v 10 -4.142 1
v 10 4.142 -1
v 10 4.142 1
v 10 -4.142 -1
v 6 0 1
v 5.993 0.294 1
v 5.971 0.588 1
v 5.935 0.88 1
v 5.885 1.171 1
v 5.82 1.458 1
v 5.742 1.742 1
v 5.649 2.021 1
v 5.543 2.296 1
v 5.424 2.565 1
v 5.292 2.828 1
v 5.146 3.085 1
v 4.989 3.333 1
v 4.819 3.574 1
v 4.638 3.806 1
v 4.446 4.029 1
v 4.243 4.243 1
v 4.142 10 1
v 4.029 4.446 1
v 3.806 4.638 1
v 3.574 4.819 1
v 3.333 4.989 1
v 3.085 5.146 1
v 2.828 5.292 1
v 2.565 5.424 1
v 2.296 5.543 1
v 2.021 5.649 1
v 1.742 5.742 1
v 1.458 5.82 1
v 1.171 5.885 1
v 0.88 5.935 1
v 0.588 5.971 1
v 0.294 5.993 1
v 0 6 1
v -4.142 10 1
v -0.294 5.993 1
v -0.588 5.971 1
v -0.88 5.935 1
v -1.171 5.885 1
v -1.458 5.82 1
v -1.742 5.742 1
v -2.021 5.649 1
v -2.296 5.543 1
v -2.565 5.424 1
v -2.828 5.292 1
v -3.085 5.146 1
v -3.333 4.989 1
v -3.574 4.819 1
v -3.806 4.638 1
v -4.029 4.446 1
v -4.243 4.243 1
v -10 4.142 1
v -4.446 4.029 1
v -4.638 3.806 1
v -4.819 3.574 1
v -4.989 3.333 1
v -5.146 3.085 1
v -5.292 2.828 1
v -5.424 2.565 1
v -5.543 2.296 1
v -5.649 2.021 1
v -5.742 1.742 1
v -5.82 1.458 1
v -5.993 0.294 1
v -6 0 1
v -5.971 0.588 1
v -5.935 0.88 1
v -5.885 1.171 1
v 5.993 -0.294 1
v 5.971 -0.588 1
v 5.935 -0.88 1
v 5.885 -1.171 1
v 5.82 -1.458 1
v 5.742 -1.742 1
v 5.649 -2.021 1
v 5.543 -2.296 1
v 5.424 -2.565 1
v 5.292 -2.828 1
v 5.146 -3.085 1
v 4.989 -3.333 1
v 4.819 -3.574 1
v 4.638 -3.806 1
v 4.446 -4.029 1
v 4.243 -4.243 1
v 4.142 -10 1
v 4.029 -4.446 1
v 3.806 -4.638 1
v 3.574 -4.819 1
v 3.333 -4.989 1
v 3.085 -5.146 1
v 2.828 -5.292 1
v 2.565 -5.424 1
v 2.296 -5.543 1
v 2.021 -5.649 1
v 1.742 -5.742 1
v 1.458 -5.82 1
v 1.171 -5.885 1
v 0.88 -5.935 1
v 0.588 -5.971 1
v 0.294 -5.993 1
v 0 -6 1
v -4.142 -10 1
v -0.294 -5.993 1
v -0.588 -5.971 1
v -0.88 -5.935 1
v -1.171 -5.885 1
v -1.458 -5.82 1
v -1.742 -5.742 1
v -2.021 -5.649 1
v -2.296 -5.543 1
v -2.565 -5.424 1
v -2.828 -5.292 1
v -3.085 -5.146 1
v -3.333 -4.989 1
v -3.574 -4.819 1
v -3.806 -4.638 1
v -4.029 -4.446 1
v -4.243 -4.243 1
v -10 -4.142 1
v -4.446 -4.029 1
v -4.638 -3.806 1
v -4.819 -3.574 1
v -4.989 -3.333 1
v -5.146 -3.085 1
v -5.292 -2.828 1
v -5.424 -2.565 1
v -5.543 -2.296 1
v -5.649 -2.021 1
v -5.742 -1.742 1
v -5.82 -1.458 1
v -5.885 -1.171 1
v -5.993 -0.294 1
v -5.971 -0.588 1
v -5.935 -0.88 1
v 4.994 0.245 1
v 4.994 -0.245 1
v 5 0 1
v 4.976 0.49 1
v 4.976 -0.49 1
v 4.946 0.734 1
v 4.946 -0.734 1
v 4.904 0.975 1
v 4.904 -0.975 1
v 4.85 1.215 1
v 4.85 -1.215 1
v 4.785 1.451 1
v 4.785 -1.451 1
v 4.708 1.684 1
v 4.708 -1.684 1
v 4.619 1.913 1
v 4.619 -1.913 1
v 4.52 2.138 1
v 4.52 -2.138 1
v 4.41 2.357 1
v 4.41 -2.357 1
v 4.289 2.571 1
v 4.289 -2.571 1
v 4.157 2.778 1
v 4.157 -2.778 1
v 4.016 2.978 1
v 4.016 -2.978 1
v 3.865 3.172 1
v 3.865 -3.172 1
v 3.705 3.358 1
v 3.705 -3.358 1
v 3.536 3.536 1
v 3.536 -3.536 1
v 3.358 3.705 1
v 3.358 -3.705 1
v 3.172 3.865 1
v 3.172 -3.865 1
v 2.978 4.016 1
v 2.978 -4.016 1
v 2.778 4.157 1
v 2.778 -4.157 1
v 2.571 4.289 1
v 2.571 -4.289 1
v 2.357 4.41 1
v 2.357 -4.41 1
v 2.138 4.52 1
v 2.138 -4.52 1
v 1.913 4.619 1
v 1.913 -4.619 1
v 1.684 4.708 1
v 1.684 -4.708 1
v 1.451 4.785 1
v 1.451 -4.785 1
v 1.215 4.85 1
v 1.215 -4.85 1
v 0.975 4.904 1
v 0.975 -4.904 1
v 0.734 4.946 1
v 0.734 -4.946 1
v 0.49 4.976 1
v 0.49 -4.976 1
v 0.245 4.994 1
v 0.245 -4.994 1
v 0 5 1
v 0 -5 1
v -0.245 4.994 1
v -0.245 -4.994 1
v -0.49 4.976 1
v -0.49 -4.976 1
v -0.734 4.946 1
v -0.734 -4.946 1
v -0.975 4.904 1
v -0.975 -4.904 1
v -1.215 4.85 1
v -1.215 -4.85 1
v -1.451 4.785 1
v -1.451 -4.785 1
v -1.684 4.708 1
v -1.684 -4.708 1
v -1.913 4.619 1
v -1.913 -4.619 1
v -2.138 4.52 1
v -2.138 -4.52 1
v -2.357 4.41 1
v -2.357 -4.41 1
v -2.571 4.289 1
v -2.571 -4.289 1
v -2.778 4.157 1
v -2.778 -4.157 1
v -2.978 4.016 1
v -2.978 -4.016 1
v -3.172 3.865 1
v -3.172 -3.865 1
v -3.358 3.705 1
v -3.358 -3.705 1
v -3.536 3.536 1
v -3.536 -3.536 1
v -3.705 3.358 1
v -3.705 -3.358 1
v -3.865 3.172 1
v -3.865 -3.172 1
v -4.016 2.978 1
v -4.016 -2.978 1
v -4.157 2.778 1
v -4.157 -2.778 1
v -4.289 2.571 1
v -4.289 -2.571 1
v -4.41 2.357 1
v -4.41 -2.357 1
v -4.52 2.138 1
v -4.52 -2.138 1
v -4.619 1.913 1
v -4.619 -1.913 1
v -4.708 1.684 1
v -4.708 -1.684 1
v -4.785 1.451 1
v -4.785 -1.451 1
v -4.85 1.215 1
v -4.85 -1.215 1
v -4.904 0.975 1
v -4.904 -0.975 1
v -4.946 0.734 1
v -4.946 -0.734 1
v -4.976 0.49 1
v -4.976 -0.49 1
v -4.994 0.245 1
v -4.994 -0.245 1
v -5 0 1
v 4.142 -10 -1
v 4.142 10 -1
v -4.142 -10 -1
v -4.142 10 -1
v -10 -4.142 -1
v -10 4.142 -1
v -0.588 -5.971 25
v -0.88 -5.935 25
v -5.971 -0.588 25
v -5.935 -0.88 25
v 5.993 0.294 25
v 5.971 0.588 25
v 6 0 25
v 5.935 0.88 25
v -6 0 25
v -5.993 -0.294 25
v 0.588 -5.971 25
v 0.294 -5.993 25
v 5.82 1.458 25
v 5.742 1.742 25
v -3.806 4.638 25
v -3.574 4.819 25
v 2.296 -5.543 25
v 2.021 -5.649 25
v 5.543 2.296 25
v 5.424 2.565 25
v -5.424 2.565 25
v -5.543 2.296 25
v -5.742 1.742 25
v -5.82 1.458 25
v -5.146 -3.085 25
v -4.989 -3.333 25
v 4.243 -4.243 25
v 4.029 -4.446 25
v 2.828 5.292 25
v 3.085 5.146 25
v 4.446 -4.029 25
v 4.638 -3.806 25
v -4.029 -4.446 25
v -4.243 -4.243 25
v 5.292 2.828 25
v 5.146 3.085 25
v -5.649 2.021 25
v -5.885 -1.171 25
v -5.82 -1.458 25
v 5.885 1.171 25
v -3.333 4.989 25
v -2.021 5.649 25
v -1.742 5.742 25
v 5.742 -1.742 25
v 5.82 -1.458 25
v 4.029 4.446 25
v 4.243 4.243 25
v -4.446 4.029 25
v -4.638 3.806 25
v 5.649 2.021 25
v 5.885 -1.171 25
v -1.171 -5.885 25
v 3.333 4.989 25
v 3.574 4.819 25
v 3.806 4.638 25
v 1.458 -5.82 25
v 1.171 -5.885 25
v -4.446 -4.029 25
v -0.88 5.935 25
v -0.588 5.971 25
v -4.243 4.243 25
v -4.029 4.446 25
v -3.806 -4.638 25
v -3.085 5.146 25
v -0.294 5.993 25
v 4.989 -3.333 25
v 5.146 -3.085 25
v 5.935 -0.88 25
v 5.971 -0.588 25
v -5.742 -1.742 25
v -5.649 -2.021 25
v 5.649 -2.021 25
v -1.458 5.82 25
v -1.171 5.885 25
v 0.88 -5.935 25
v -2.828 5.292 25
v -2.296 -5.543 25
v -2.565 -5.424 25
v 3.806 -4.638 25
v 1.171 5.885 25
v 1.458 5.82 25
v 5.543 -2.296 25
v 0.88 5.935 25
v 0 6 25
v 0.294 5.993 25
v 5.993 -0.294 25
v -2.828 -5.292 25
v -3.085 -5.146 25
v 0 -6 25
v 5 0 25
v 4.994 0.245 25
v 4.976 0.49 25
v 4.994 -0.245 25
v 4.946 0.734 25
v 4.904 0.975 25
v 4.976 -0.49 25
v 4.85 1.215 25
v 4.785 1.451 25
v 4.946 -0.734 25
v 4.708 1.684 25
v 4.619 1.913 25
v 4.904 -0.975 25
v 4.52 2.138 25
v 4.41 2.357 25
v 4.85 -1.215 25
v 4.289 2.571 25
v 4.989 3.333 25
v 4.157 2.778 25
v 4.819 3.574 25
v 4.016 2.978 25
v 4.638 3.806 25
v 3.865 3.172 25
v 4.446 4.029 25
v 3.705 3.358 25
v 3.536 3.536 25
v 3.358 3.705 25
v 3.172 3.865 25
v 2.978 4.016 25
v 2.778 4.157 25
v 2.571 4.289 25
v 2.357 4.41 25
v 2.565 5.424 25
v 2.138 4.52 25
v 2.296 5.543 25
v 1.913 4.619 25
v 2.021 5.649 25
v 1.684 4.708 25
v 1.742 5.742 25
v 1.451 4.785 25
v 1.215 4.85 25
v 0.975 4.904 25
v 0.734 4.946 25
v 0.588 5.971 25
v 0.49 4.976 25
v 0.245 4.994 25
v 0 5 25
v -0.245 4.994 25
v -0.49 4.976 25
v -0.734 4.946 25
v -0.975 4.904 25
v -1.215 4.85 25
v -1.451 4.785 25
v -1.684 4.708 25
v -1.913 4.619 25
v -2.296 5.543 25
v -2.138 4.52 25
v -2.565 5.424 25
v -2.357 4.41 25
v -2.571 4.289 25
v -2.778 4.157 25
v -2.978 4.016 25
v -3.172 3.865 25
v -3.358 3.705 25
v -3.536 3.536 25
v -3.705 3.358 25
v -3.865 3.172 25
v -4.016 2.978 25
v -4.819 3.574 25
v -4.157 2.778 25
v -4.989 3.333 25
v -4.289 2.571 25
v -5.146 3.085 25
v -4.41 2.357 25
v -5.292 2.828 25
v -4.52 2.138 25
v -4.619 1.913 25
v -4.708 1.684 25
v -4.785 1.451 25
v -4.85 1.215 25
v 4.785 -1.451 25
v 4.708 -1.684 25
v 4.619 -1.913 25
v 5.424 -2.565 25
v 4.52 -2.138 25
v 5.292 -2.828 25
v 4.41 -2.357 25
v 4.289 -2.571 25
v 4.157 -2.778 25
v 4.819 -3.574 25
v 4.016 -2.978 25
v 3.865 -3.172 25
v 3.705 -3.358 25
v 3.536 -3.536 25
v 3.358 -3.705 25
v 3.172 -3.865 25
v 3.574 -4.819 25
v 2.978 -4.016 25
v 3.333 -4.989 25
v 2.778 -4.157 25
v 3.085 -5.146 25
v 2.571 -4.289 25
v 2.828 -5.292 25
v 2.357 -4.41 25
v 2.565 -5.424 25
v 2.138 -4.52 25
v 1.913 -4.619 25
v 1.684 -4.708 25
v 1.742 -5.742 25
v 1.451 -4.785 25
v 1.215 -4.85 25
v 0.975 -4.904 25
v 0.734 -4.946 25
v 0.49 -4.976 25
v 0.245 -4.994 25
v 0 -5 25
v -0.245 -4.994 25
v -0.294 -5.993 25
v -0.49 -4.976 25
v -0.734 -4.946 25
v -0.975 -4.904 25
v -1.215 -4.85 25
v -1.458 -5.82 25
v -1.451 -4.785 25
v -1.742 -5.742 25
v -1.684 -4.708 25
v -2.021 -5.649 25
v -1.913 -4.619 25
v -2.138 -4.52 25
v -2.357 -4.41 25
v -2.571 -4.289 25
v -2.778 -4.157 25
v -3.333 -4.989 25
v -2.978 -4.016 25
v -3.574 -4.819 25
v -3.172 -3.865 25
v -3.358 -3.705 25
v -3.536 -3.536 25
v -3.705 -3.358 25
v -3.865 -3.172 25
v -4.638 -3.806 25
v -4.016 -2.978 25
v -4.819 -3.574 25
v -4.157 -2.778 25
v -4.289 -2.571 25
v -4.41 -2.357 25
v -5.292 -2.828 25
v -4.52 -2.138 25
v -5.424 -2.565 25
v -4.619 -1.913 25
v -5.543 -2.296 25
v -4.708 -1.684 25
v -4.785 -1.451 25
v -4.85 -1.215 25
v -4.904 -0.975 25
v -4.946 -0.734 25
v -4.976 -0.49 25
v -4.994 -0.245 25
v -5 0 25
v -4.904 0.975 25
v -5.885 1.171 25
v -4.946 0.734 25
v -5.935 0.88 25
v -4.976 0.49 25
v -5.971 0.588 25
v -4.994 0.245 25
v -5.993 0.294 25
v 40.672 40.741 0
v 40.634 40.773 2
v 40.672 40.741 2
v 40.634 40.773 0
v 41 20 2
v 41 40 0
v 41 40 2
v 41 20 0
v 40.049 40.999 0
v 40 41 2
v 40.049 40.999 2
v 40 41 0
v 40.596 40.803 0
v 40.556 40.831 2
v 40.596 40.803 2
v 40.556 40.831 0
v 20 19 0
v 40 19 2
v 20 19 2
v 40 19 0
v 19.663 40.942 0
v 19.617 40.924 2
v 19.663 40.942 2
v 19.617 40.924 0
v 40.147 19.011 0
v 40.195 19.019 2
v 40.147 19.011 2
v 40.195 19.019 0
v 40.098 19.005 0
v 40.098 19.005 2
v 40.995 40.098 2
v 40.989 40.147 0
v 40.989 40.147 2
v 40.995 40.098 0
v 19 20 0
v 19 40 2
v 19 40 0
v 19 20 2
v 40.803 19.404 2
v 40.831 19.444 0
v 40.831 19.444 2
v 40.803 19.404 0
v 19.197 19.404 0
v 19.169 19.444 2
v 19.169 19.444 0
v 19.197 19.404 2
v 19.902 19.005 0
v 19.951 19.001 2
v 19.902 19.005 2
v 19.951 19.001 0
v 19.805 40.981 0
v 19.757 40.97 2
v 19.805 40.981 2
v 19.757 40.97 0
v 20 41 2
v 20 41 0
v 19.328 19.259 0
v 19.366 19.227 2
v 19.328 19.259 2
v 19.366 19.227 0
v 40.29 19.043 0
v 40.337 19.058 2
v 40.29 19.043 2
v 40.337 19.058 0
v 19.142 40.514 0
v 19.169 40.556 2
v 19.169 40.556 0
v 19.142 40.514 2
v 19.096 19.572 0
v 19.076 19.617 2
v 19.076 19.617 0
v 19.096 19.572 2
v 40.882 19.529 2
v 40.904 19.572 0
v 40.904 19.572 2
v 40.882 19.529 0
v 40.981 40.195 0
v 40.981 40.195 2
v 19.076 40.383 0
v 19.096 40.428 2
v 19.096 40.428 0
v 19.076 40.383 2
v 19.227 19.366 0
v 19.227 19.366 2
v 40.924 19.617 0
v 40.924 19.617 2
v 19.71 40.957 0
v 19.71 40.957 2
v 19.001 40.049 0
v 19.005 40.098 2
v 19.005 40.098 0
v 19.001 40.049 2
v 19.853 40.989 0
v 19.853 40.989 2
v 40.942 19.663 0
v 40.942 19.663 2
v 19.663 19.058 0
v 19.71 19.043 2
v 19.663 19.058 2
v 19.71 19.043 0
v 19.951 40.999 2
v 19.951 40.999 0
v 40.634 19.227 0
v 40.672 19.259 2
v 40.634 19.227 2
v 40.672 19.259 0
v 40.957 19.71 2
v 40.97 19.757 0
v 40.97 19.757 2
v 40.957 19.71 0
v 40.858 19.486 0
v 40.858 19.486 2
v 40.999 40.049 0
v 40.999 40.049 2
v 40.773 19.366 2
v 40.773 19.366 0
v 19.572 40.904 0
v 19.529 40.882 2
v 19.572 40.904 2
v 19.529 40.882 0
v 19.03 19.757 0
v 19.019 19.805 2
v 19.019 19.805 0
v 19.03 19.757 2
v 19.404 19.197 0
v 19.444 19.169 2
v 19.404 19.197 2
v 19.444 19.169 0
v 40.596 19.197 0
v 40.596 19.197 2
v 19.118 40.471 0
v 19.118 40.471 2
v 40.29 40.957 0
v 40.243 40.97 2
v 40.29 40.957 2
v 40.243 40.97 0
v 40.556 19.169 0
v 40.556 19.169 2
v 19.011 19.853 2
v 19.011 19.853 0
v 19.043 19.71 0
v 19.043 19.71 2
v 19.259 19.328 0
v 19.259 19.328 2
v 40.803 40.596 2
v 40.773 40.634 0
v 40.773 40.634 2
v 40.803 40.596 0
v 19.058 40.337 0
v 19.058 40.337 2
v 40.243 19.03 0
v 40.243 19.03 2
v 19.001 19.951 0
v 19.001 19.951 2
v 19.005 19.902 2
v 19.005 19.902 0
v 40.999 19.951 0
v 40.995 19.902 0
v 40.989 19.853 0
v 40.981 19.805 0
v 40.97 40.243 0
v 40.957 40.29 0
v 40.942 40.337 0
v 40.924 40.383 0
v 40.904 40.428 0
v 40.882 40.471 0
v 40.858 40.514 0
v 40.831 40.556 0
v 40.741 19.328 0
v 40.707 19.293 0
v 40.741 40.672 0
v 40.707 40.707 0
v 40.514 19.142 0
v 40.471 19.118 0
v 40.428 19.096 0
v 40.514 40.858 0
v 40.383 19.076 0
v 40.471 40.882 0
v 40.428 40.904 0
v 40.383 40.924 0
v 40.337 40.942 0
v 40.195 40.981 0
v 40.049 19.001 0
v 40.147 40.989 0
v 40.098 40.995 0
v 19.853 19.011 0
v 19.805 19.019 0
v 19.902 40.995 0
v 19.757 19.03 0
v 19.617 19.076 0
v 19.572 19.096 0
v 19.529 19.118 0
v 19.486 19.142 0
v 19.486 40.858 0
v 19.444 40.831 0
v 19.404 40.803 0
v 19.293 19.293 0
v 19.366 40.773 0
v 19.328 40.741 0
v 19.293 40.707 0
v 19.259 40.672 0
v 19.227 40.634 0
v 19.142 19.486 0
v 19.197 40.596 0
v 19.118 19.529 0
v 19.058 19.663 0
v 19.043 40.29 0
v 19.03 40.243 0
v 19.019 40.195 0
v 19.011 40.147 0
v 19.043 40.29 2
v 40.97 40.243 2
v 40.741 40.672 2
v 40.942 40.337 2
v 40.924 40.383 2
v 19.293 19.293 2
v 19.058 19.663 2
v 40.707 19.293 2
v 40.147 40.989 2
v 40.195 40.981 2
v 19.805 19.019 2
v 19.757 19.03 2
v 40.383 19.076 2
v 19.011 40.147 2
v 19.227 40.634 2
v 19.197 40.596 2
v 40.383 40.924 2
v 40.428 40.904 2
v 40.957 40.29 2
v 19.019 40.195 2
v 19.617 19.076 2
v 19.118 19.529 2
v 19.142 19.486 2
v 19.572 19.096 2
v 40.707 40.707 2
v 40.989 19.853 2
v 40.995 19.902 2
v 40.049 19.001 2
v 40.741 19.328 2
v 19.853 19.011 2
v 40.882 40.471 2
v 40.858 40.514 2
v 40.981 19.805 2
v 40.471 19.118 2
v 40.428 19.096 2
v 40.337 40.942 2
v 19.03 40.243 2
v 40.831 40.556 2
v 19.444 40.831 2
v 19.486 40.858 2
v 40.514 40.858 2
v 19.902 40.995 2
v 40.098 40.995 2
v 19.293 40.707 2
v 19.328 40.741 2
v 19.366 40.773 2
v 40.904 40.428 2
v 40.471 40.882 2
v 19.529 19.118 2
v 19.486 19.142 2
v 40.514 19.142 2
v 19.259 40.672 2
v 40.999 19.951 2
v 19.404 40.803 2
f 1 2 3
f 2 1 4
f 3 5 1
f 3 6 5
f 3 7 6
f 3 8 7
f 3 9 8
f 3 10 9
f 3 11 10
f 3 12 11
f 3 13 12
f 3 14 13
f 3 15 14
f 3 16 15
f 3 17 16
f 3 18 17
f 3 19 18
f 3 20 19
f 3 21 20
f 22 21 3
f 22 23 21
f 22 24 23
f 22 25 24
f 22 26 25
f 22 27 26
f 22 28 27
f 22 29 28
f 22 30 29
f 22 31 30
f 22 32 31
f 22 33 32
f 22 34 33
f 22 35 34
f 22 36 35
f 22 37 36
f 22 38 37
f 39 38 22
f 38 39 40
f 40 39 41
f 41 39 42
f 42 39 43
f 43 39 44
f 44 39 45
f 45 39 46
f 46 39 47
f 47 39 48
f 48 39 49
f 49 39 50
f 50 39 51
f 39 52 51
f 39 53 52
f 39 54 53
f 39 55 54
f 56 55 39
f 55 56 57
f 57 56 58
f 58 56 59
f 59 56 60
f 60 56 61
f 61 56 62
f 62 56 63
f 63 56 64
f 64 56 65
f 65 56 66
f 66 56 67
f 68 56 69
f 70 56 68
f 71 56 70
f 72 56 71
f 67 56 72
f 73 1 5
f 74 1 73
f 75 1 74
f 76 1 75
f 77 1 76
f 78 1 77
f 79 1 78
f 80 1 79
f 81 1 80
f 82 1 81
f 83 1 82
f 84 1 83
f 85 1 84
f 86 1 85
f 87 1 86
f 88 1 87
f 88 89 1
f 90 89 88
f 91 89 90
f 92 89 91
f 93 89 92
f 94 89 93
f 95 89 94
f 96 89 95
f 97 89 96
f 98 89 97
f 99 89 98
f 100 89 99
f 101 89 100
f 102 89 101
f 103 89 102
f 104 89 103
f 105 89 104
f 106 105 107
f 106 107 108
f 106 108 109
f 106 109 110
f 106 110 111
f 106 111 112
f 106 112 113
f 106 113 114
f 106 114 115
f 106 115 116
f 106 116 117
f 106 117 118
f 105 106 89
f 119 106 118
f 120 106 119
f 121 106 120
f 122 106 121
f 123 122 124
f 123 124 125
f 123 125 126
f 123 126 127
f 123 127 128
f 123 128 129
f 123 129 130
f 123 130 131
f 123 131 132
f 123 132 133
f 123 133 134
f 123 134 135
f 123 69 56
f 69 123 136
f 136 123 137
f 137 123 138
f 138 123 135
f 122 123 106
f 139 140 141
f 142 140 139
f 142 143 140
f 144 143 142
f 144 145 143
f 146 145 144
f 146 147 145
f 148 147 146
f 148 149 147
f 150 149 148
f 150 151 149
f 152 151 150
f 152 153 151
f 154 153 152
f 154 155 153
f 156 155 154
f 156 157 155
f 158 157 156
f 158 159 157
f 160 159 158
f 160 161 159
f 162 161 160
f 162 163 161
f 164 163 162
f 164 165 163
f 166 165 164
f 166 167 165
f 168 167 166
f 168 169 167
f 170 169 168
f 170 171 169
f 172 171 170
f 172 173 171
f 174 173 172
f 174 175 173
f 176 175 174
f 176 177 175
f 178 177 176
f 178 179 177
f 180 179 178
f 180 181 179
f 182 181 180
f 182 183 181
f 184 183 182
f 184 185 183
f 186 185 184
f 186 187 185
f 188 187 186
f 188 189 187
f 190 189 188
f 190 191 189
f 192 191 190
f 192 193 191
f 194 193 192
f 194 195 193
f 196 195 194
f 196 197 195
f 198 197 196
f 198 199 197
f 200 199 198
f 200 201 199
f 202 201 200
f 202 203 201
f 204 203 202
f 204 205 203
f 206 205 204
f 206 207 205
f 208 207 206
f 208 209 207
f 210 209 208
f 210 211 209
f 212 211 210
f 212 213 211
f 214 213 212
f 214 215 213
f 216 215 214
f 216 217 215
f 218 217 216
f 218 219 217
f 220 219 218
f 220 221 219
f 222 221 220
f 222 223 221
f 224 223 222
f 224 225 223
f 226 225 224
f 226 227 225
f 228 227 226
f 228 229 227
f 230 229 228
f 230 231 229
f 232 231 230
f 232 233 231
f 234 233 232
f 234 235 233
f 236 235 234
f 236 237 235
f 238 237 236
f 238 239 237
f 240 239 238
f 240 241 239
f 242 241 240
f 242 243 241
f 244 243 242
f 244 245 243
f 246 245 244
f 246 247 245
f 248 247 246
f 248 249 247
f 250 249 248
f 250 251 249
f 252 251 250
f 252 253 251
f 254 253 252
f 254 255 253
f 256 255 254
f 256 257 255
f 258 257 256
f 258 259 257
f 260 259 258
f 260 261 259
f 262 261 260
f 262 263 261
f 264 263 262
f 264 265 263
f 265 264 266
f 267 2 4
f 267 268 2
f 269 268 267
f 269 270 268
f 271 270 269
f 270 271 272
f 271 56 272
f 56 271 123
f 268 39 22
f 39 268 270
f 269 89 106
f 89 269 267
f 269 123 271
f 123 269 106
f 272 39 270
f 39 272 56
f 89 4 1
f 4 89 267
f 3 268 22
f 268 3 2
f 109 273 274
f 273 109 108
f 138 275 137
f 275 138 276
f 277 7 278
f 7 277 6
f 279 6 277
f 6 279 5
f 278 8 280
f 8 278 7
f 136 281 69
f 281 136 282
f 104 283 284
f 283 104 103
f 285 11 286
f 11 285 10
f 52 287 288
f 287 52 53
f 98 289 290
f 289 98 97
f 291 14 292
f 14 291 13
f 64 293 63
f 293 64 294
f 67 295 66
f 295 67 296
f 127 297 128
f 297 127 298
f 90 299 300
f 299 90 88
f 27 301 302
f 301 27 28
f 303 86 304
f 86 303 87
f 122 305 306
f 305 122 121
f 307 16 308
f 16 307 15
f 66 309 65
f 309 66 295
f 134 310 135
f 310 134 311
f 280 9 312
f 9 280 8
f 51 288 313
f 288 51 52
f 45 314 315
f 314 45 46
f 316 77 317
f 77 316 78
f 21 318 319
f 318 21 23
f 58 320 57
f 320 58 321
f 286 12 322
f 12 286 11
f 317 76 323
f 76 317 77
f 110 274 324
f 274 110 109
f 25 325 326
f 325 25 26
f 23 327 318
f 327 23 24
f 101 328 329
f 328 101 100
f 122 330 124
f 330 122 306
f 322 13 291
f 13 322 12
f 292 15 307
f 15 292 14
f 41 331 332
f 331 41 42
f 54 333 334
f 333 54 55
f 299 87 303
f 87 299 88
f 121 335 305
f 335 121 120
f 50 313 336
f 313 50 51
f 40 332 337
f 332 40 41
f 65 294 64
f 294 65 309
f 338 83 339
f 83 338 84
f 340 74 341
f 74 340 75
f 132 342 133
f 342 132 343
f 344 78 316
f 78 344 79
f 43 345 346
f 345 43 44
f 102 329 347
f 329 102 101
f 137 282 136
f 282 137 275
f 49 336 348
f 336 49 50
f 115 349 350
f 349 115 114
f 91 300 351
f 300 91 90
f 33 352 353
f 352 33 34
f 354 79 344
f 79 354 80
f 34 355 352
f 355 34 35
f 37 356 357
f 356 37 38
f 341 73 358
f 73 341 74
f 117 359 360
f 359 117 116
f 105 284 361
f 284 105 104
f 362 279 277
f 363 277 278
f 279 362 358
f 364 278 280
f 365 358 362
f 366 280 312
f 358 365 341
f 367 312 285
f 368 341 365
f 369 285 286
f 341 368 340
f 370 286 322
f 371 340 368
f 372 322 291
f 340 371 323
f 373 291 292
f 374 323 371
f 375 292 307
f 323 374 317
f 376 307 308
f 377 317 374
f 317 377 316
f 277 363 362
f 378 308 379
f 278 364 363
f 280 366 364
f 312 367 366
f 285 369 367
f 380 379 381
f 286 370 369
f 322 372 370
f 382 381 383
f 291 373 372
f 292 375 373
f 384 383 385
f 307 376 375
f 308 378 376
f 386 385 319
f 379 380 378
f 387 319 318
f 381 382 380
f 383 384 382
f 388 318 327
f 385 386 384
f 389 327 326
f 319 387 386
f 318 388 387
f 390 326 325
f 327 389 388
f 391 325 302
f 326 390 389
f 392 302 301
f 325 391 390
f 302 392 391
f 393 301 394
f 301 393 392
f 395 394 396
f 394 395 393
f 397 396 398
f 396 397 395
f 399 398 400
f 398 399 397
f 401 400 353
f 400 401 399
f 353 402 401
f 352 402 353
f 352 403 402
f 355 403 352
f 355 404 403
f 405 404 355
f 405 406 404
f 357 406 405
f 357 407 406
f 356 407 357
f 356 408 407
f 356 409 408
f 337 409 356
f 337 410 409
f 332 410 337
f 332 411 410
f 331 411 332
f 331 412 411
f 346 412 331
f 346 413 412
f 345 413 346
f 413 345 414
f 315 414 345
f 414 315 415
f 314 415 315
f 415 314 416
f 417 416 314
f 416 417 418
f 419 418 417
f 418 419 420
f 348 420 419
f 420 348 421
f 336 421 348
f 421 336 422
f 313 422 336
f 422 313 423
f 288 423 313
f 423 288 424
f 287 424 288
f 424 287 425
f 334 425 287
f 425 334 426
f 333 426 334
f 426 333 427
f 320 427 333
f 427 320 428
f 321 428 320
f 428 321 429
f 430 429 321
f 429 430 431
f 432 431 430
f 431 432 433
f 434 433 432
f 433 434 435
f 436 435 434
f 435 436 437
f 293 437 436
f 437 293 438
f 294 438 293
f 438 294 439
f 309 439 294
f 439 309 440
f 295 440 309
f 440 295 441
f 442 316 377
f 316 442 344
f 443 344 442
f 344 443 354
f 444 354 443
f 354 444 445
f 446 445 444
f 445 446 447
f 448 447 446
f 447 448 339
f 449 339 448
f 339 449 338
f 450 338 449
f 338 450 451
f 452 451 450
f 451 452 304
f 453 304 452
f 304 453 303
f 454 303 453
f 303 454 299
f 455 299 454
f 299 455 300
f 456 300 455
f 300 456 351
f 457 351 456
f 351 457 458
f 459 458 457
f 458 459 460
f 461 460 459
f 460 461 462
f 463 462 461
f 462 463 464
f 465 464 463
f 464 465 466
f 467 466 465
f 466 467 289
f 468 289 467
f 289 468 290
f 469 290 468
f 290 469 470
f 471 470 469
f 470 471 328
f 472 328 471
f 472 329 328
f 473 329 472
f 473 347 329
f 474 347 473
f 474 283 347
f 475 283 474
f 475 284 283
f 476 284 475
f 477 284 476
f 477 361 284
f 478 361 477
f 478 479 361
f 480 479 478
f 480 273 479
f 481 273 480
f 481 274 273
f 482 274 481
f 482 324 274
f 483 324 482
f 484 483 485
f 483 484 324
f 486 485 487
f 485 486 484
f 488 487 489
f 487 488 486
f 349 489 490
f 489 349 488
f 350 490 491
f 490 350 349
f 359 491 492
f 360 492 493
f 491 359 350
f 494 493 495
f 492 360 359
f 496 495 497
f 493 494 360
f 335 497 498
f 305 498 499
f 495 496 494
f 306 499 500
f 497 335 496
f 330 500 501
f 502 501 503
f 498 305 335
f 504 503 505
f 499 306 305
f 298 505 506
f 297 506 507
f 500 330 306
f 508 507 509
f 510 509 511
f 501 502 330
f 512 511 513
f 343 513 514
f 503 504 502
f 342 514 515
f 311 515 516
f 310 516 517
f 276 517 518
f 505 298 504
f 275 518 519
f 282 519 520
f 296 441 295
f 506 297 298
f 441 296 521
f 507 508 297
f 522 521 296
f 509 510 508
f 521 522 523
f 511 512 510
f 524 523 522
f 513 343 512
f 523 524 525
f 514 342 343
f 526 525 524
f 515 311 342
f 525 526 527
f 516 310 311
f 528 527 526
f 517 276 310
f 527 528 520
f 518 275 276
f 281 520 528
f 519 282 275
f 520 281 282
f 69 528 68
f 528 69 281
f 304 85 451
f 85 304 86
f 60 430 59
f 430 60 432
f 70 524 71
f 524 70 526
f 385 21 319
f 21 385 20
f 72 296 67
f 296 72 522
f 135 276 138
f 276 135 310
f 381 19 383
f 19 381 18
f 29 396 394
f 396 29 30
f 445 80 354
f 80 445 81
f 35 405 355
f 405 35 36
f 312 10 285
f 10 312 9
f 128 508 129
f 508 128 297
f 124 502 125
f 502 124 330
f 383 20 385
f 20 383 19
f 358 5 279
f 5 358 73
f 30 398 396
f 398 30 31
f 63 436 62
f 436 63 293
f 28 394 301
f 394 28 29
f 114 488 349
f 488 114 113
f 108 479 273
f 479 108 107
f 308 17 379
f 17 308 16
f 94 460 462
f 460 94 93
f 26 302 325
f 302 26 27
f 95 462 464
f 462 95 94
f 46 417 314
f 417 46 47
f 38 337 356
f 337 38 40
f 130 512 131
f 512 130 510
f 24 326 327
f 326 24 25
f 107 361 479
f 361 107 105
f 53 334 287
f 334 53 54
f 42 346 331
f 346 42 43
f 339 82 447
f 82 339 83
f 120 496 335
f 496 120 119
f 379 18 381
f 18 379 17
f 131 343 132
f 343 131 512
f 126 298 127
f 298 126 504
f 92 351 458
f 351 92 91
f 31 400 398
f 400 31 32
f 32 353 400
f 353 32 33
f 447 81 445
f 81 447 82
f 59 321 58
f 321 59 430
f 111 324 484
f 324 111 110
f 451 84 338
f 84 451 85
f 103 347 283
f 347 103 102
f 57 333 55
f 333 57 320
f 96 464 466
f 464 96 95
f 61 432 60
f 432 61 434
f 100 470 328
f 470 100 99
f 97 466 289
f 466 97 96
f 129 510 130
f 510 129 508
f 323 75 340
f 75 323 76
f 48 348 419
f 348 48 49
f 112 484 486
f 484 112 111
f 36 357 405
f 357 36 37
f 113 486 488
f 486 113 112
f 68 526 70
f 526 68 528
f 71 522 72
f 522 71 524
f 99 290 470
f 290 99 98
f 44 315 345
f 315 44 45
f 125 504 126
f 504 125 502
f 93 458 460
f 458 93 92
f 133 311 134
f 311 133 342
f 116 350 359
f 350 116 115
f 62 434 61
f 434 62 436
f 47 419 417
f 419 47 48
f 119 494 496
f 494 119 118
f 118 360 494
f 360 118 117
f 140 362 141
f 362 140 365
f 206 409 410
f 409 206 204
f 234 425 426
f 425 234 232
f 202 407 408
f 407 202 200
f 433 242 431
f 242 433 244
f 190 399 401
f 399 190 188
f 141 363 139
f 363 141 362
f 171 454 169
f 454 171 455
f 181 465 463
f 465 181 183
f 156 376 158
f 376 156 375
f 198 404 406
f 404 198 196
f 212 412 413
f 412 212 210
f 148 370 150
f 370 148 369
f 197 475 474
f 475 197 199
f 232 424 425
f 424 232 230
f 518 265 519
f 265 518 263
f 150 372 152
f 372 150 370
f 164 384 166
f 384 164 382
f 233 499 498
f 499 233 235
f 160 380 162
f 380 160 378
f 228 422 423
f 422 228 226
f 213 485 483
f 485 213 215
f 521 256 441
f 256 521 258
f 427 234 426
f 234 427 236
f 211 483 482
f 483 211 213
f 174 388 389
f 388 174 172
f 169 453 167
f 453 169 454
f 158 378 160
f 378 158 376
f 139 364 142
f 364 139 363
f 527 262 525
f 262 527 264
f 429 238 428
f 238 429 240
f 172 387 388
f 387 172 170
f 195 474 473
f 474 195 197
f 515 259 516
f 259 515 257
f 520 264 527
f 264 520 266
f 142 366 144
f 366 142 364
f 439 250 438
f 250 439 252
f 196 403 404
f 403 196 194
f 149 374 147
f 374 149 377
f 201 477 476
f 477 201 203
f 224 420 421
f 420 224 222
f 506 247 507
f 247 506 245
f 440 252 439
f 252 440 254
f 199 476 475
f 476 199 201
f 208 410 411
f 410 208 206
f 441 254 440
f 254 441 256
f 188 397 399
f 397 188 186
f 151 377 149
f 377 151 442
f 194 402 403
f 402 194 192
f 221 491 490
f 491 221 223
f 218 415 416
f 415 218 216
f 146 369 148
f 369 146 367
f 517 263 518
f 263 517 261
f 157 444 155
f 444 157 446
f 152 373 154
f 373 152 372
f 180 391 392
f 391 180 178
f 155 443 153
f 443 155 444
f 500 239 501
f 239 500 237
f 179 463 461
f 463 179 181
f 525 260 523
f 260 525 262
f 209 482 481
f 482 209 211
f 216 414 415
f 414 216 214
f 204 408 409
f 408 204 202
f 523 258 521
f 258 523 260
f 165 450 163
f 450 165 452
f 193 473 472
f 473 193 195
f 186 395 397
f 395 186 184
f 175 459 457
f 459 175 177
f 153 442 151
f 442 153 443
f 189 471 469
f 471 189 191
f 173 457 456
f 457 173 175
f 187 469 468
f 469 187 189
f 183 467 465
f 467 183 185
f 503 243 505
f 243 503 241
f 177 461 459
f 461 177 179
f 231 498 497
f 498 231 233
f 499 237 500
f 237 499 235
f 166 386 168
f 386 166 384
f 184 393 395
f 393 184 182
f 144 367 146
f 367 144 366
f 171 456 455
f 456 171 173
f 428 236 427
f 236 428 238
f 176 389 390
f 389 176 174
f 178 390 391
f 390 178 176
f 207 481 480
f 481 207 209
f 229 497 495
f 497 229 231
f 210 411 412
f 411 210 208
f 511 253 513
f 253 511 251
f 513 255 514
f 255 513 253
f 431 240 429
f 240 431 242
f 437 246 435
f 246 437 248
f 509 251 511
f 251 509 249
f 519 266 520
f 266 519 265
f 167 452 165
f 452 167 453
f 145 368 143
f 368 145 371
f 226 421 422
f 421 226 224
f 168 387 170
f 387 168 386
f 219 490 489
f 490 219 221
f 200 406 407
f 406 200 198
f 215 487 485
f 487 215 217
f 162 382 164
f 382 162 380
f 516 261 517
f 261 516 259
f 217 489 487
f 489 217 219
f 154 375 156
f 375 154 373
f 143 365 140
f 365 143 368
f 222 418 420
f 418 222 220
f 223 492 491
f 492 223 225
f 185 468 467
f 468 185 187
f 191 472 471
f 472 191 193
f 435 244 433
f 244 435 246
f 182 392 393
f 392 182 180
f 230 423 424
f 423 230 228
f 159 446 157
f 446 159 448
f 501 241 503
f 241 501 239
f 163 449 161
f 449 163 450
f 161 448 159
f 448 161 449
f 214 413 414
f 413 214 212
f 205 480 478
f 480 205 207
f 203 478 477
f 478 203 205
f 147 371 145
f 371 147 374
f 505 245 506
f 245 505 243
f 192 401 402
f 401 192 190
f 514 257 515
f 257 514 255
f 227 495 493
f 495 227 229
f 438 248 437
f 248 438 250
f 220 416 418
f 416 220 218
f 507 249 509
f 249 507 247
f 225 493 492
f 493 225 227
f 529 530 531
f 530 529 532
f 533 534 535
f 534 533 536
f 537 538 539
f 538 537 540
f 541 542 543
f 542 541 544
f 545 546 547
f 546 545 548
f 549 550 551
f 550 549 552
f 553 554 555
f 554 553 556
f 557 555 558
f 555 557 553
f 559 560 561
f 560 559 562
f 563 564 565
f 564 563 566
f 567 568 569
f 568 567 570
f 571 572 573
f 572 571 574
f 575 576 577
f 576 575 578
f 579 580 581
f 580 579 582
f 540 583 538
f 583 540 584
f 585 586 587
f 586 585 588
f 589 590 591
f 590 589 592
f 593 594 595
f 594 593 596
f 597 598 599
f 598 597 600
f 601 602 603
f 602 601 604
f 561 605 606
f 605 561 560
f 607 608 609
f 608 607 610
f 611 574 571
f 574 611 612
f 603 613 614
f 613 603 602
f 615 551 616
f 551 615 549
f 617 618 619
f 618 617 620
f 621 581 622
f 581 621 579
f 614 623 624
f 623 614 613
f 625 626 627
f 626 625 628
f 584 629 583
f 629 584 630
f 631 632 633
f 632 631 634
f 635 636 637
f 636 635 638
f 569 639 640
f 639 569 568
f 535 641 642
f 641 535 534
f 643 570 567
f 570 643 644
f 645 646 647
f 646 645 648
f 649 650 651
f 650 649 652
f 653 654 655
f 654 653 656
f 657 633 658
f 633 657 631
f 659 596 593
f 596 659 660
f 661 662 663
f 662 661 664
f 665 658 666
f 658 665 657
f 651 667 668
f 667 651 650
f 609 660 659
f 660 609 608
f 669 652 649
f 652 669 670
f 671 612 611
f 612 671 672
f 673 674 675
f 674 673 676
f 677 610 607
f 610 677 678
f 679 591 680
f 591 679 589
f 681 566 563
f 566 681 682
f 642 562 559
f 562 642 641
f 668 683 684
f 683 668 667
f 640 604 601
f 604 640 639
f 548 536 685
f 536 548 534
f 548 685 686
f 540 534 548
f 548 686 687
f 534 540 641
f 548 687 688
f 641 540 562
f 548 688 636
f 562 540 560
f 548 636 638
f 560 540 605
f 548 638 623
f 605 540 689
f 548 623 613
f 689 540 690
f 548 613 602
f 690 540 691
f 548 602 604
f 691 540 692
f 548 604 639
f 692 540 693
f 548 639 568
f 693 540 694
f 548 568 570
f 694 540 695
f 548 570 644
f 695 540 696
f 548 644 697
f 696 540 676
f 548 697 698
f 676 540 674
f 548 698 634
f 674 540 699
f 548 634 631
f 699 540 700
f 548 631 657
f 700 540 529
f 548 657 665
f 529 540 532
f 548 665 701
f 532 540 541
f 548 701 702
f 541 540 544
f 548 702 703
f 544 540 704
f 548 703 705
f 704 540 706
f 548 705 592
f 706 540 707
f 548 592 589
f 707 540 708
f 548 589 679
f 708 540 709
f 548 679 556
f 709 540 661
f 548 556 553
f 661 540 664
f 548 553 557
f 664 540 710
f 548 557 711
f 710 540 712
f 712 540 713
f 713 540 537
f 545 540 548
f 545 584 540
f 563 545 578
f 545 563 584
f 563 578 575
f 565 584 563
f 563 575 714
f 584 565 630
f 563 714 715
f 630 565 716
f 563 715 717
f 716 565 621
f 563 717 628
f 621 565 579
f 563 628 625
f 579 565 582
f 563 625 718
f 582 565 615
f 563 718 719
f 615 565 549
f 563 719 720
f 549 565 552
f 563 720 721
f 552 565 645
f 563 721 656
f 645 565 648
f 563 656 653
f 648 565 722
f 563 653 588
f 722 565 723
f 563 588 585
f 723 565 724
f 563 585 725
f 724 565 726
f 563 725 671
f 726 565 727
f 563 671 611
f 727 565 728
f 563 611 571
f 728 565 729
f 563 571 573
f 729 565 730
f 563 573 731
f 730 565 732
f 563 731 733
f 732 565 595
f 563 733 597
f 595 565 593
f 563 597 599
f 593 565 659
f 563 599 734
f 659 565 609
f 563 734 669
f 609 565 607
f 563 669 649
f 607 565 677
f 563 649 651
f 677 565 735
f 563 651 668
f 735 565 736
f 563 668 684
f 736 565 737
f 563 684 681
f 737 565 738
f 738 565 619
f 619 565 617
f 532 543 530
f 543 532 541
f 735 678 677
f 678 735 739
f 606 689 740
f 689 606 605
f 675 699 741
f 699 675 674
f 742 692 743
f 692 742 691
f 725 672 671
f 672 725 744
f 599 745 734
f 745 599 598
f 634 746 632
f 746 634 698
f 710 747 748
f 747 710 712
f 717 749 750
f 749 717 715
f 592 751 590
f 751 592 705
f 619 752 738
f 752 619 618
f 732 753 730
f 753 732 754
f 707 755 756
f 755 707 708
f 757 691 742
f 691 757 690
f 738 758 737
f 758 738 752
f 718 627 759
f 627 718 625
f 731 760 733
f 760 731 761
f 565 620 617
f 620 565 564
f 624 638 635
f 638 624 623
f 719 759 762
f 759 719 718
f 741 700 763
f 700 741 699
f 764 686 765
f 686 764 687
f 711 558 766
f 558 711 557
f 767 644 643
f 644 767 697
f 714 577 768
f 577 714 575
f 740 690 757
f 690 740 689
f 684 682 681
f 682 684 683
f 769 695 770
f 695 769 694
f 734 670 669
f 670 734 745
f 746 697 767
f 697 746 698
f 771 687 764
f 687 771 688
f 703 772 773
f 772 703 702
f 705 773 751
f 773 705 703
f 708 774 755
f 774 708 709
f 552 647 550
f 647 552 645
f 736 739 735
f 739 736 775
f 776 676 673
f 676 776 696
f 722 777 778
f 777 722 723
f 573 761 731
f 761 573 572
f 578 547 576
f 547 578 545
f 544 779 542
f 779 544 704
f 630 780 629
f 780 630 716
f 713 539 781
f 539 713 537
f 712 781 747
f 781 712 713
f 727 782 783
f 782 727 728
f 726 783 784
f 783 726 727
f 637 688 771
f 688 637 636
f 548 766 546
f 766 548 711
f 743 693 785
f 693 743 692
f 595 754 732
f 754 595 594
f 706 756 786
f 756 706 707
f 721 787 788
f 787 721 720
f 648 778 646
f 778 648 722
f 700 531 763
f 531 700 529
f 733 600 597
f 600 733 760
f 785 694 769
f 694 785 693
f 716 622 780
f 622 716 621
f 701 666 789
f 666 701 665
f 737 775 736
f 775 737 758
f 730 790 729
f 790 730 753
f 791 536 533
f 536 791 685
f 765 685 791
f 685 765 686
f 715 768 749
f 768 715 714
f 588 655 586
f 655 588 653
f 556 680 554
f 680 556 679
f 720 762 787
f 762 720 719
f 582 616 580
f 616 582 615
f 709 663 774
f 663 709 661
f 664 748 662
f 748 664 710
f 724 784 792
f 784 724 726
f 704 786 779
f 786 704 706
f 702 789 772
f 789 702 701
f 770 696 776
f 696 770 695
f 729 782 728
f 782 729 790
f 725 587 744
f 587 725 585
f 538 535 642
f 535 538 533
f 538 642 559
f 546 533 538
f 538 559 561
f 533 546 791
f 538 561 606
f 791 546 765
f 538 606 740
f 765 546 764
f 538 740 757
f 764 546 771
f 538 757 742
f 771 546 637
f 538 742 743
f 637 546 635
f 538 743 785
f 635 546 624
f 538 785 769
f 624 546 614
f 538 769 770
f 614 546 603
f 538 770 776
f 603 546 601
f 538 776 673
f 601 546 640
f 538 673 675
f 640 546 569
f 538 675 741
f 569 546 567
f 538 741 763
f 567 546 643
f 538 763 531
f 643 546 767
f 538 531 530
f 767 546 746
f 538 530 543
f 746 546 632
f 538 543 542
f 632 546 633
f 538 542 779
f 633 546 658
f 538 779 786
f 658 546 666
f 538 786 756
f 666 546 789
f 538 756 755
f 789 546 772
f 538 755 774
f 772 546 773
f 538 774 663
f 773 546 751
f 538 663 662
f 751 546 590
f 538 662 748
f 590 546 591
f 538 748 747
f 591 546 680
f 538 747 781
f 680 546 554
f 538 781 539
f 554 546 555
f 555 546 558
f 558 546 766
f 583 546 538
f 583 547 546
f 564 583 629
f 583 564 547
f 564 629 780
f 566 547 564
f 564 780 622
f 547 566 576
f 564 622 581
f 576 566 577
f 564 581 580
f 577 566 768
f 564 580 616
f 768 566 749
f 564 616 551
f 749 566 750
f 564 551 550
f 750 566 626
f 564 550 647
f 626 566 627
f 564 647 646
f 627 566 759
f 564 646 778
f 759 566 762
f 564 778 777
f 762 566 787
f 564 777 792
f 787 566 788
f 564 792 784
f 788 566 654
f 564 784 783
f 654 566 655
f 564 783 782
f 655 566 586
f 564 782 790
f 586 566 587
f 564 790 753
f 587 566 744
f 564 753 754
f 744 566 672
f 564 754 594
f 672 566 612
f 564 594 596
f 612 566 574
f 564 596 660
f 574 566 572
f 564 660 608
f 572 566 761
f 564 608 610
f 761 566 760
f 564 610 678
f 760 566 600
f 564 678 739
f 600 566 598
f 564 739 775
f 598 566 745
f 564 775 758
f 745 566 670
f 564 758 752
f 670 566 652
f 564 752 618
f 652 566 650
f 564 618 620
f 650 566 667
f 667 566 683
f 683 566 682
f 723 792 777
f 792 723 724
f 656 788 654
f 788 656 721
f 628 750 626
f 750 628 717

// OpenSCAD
// intermediate shapes

// numbers used for size are interpreted by most printers as millimeters
thickness = 2; // variable to create 3mm thick pieces
diameter = 20; // 20mm circles
height = 25; // 45mm

// $fn is the variable for circles that determine how many 'facets' 
// are displayed.  Default is 10. 128 makes smoother circles
fn = 128;

// intersection keeps only the area where the items overlap
// create a hexagon

intersection()
{
    cube([diameter, diameter, thickness], center=true);
    
    // rotate spins the object on the [x,y,z] planes
    // easier to rotate before translate....e.g. translate-->rotate-->object
    // functions get called from the inside-out.
    rotate([0,0,45])cube([diameter, diameter, thickness], center=true);
}


// difference keeps only the first item with the overlap part of the second item removed
// create a tub
difference()
{
    cylinder(d=diameter*.60, h=height, $fn=fn);
    cylinder(d=diameter*.60-thickness, h=height, $fn=fn);
}

// hull wraps all areas with material (but does not increase the height)
// think of it like shrinkwrap
hull()
{
    translate([diameter, diameter, 0])cylinder(d=thickness, h=thickness, $fn=fn);
    translate([diameter*2, diameter, 0])cylinder(d=thickness, h=thickness, $fn=fn);
    translate([diameter*2, diameter*2, 0])cylinder(d=thickness, h=thickness, $fn=fn);
    translate([diameter, diameter*2, 0])cylinder(d=thickness, h=thickness, $fn=fn);
}

//try wrapping the code above in hull, and you will get a duck foot :)
